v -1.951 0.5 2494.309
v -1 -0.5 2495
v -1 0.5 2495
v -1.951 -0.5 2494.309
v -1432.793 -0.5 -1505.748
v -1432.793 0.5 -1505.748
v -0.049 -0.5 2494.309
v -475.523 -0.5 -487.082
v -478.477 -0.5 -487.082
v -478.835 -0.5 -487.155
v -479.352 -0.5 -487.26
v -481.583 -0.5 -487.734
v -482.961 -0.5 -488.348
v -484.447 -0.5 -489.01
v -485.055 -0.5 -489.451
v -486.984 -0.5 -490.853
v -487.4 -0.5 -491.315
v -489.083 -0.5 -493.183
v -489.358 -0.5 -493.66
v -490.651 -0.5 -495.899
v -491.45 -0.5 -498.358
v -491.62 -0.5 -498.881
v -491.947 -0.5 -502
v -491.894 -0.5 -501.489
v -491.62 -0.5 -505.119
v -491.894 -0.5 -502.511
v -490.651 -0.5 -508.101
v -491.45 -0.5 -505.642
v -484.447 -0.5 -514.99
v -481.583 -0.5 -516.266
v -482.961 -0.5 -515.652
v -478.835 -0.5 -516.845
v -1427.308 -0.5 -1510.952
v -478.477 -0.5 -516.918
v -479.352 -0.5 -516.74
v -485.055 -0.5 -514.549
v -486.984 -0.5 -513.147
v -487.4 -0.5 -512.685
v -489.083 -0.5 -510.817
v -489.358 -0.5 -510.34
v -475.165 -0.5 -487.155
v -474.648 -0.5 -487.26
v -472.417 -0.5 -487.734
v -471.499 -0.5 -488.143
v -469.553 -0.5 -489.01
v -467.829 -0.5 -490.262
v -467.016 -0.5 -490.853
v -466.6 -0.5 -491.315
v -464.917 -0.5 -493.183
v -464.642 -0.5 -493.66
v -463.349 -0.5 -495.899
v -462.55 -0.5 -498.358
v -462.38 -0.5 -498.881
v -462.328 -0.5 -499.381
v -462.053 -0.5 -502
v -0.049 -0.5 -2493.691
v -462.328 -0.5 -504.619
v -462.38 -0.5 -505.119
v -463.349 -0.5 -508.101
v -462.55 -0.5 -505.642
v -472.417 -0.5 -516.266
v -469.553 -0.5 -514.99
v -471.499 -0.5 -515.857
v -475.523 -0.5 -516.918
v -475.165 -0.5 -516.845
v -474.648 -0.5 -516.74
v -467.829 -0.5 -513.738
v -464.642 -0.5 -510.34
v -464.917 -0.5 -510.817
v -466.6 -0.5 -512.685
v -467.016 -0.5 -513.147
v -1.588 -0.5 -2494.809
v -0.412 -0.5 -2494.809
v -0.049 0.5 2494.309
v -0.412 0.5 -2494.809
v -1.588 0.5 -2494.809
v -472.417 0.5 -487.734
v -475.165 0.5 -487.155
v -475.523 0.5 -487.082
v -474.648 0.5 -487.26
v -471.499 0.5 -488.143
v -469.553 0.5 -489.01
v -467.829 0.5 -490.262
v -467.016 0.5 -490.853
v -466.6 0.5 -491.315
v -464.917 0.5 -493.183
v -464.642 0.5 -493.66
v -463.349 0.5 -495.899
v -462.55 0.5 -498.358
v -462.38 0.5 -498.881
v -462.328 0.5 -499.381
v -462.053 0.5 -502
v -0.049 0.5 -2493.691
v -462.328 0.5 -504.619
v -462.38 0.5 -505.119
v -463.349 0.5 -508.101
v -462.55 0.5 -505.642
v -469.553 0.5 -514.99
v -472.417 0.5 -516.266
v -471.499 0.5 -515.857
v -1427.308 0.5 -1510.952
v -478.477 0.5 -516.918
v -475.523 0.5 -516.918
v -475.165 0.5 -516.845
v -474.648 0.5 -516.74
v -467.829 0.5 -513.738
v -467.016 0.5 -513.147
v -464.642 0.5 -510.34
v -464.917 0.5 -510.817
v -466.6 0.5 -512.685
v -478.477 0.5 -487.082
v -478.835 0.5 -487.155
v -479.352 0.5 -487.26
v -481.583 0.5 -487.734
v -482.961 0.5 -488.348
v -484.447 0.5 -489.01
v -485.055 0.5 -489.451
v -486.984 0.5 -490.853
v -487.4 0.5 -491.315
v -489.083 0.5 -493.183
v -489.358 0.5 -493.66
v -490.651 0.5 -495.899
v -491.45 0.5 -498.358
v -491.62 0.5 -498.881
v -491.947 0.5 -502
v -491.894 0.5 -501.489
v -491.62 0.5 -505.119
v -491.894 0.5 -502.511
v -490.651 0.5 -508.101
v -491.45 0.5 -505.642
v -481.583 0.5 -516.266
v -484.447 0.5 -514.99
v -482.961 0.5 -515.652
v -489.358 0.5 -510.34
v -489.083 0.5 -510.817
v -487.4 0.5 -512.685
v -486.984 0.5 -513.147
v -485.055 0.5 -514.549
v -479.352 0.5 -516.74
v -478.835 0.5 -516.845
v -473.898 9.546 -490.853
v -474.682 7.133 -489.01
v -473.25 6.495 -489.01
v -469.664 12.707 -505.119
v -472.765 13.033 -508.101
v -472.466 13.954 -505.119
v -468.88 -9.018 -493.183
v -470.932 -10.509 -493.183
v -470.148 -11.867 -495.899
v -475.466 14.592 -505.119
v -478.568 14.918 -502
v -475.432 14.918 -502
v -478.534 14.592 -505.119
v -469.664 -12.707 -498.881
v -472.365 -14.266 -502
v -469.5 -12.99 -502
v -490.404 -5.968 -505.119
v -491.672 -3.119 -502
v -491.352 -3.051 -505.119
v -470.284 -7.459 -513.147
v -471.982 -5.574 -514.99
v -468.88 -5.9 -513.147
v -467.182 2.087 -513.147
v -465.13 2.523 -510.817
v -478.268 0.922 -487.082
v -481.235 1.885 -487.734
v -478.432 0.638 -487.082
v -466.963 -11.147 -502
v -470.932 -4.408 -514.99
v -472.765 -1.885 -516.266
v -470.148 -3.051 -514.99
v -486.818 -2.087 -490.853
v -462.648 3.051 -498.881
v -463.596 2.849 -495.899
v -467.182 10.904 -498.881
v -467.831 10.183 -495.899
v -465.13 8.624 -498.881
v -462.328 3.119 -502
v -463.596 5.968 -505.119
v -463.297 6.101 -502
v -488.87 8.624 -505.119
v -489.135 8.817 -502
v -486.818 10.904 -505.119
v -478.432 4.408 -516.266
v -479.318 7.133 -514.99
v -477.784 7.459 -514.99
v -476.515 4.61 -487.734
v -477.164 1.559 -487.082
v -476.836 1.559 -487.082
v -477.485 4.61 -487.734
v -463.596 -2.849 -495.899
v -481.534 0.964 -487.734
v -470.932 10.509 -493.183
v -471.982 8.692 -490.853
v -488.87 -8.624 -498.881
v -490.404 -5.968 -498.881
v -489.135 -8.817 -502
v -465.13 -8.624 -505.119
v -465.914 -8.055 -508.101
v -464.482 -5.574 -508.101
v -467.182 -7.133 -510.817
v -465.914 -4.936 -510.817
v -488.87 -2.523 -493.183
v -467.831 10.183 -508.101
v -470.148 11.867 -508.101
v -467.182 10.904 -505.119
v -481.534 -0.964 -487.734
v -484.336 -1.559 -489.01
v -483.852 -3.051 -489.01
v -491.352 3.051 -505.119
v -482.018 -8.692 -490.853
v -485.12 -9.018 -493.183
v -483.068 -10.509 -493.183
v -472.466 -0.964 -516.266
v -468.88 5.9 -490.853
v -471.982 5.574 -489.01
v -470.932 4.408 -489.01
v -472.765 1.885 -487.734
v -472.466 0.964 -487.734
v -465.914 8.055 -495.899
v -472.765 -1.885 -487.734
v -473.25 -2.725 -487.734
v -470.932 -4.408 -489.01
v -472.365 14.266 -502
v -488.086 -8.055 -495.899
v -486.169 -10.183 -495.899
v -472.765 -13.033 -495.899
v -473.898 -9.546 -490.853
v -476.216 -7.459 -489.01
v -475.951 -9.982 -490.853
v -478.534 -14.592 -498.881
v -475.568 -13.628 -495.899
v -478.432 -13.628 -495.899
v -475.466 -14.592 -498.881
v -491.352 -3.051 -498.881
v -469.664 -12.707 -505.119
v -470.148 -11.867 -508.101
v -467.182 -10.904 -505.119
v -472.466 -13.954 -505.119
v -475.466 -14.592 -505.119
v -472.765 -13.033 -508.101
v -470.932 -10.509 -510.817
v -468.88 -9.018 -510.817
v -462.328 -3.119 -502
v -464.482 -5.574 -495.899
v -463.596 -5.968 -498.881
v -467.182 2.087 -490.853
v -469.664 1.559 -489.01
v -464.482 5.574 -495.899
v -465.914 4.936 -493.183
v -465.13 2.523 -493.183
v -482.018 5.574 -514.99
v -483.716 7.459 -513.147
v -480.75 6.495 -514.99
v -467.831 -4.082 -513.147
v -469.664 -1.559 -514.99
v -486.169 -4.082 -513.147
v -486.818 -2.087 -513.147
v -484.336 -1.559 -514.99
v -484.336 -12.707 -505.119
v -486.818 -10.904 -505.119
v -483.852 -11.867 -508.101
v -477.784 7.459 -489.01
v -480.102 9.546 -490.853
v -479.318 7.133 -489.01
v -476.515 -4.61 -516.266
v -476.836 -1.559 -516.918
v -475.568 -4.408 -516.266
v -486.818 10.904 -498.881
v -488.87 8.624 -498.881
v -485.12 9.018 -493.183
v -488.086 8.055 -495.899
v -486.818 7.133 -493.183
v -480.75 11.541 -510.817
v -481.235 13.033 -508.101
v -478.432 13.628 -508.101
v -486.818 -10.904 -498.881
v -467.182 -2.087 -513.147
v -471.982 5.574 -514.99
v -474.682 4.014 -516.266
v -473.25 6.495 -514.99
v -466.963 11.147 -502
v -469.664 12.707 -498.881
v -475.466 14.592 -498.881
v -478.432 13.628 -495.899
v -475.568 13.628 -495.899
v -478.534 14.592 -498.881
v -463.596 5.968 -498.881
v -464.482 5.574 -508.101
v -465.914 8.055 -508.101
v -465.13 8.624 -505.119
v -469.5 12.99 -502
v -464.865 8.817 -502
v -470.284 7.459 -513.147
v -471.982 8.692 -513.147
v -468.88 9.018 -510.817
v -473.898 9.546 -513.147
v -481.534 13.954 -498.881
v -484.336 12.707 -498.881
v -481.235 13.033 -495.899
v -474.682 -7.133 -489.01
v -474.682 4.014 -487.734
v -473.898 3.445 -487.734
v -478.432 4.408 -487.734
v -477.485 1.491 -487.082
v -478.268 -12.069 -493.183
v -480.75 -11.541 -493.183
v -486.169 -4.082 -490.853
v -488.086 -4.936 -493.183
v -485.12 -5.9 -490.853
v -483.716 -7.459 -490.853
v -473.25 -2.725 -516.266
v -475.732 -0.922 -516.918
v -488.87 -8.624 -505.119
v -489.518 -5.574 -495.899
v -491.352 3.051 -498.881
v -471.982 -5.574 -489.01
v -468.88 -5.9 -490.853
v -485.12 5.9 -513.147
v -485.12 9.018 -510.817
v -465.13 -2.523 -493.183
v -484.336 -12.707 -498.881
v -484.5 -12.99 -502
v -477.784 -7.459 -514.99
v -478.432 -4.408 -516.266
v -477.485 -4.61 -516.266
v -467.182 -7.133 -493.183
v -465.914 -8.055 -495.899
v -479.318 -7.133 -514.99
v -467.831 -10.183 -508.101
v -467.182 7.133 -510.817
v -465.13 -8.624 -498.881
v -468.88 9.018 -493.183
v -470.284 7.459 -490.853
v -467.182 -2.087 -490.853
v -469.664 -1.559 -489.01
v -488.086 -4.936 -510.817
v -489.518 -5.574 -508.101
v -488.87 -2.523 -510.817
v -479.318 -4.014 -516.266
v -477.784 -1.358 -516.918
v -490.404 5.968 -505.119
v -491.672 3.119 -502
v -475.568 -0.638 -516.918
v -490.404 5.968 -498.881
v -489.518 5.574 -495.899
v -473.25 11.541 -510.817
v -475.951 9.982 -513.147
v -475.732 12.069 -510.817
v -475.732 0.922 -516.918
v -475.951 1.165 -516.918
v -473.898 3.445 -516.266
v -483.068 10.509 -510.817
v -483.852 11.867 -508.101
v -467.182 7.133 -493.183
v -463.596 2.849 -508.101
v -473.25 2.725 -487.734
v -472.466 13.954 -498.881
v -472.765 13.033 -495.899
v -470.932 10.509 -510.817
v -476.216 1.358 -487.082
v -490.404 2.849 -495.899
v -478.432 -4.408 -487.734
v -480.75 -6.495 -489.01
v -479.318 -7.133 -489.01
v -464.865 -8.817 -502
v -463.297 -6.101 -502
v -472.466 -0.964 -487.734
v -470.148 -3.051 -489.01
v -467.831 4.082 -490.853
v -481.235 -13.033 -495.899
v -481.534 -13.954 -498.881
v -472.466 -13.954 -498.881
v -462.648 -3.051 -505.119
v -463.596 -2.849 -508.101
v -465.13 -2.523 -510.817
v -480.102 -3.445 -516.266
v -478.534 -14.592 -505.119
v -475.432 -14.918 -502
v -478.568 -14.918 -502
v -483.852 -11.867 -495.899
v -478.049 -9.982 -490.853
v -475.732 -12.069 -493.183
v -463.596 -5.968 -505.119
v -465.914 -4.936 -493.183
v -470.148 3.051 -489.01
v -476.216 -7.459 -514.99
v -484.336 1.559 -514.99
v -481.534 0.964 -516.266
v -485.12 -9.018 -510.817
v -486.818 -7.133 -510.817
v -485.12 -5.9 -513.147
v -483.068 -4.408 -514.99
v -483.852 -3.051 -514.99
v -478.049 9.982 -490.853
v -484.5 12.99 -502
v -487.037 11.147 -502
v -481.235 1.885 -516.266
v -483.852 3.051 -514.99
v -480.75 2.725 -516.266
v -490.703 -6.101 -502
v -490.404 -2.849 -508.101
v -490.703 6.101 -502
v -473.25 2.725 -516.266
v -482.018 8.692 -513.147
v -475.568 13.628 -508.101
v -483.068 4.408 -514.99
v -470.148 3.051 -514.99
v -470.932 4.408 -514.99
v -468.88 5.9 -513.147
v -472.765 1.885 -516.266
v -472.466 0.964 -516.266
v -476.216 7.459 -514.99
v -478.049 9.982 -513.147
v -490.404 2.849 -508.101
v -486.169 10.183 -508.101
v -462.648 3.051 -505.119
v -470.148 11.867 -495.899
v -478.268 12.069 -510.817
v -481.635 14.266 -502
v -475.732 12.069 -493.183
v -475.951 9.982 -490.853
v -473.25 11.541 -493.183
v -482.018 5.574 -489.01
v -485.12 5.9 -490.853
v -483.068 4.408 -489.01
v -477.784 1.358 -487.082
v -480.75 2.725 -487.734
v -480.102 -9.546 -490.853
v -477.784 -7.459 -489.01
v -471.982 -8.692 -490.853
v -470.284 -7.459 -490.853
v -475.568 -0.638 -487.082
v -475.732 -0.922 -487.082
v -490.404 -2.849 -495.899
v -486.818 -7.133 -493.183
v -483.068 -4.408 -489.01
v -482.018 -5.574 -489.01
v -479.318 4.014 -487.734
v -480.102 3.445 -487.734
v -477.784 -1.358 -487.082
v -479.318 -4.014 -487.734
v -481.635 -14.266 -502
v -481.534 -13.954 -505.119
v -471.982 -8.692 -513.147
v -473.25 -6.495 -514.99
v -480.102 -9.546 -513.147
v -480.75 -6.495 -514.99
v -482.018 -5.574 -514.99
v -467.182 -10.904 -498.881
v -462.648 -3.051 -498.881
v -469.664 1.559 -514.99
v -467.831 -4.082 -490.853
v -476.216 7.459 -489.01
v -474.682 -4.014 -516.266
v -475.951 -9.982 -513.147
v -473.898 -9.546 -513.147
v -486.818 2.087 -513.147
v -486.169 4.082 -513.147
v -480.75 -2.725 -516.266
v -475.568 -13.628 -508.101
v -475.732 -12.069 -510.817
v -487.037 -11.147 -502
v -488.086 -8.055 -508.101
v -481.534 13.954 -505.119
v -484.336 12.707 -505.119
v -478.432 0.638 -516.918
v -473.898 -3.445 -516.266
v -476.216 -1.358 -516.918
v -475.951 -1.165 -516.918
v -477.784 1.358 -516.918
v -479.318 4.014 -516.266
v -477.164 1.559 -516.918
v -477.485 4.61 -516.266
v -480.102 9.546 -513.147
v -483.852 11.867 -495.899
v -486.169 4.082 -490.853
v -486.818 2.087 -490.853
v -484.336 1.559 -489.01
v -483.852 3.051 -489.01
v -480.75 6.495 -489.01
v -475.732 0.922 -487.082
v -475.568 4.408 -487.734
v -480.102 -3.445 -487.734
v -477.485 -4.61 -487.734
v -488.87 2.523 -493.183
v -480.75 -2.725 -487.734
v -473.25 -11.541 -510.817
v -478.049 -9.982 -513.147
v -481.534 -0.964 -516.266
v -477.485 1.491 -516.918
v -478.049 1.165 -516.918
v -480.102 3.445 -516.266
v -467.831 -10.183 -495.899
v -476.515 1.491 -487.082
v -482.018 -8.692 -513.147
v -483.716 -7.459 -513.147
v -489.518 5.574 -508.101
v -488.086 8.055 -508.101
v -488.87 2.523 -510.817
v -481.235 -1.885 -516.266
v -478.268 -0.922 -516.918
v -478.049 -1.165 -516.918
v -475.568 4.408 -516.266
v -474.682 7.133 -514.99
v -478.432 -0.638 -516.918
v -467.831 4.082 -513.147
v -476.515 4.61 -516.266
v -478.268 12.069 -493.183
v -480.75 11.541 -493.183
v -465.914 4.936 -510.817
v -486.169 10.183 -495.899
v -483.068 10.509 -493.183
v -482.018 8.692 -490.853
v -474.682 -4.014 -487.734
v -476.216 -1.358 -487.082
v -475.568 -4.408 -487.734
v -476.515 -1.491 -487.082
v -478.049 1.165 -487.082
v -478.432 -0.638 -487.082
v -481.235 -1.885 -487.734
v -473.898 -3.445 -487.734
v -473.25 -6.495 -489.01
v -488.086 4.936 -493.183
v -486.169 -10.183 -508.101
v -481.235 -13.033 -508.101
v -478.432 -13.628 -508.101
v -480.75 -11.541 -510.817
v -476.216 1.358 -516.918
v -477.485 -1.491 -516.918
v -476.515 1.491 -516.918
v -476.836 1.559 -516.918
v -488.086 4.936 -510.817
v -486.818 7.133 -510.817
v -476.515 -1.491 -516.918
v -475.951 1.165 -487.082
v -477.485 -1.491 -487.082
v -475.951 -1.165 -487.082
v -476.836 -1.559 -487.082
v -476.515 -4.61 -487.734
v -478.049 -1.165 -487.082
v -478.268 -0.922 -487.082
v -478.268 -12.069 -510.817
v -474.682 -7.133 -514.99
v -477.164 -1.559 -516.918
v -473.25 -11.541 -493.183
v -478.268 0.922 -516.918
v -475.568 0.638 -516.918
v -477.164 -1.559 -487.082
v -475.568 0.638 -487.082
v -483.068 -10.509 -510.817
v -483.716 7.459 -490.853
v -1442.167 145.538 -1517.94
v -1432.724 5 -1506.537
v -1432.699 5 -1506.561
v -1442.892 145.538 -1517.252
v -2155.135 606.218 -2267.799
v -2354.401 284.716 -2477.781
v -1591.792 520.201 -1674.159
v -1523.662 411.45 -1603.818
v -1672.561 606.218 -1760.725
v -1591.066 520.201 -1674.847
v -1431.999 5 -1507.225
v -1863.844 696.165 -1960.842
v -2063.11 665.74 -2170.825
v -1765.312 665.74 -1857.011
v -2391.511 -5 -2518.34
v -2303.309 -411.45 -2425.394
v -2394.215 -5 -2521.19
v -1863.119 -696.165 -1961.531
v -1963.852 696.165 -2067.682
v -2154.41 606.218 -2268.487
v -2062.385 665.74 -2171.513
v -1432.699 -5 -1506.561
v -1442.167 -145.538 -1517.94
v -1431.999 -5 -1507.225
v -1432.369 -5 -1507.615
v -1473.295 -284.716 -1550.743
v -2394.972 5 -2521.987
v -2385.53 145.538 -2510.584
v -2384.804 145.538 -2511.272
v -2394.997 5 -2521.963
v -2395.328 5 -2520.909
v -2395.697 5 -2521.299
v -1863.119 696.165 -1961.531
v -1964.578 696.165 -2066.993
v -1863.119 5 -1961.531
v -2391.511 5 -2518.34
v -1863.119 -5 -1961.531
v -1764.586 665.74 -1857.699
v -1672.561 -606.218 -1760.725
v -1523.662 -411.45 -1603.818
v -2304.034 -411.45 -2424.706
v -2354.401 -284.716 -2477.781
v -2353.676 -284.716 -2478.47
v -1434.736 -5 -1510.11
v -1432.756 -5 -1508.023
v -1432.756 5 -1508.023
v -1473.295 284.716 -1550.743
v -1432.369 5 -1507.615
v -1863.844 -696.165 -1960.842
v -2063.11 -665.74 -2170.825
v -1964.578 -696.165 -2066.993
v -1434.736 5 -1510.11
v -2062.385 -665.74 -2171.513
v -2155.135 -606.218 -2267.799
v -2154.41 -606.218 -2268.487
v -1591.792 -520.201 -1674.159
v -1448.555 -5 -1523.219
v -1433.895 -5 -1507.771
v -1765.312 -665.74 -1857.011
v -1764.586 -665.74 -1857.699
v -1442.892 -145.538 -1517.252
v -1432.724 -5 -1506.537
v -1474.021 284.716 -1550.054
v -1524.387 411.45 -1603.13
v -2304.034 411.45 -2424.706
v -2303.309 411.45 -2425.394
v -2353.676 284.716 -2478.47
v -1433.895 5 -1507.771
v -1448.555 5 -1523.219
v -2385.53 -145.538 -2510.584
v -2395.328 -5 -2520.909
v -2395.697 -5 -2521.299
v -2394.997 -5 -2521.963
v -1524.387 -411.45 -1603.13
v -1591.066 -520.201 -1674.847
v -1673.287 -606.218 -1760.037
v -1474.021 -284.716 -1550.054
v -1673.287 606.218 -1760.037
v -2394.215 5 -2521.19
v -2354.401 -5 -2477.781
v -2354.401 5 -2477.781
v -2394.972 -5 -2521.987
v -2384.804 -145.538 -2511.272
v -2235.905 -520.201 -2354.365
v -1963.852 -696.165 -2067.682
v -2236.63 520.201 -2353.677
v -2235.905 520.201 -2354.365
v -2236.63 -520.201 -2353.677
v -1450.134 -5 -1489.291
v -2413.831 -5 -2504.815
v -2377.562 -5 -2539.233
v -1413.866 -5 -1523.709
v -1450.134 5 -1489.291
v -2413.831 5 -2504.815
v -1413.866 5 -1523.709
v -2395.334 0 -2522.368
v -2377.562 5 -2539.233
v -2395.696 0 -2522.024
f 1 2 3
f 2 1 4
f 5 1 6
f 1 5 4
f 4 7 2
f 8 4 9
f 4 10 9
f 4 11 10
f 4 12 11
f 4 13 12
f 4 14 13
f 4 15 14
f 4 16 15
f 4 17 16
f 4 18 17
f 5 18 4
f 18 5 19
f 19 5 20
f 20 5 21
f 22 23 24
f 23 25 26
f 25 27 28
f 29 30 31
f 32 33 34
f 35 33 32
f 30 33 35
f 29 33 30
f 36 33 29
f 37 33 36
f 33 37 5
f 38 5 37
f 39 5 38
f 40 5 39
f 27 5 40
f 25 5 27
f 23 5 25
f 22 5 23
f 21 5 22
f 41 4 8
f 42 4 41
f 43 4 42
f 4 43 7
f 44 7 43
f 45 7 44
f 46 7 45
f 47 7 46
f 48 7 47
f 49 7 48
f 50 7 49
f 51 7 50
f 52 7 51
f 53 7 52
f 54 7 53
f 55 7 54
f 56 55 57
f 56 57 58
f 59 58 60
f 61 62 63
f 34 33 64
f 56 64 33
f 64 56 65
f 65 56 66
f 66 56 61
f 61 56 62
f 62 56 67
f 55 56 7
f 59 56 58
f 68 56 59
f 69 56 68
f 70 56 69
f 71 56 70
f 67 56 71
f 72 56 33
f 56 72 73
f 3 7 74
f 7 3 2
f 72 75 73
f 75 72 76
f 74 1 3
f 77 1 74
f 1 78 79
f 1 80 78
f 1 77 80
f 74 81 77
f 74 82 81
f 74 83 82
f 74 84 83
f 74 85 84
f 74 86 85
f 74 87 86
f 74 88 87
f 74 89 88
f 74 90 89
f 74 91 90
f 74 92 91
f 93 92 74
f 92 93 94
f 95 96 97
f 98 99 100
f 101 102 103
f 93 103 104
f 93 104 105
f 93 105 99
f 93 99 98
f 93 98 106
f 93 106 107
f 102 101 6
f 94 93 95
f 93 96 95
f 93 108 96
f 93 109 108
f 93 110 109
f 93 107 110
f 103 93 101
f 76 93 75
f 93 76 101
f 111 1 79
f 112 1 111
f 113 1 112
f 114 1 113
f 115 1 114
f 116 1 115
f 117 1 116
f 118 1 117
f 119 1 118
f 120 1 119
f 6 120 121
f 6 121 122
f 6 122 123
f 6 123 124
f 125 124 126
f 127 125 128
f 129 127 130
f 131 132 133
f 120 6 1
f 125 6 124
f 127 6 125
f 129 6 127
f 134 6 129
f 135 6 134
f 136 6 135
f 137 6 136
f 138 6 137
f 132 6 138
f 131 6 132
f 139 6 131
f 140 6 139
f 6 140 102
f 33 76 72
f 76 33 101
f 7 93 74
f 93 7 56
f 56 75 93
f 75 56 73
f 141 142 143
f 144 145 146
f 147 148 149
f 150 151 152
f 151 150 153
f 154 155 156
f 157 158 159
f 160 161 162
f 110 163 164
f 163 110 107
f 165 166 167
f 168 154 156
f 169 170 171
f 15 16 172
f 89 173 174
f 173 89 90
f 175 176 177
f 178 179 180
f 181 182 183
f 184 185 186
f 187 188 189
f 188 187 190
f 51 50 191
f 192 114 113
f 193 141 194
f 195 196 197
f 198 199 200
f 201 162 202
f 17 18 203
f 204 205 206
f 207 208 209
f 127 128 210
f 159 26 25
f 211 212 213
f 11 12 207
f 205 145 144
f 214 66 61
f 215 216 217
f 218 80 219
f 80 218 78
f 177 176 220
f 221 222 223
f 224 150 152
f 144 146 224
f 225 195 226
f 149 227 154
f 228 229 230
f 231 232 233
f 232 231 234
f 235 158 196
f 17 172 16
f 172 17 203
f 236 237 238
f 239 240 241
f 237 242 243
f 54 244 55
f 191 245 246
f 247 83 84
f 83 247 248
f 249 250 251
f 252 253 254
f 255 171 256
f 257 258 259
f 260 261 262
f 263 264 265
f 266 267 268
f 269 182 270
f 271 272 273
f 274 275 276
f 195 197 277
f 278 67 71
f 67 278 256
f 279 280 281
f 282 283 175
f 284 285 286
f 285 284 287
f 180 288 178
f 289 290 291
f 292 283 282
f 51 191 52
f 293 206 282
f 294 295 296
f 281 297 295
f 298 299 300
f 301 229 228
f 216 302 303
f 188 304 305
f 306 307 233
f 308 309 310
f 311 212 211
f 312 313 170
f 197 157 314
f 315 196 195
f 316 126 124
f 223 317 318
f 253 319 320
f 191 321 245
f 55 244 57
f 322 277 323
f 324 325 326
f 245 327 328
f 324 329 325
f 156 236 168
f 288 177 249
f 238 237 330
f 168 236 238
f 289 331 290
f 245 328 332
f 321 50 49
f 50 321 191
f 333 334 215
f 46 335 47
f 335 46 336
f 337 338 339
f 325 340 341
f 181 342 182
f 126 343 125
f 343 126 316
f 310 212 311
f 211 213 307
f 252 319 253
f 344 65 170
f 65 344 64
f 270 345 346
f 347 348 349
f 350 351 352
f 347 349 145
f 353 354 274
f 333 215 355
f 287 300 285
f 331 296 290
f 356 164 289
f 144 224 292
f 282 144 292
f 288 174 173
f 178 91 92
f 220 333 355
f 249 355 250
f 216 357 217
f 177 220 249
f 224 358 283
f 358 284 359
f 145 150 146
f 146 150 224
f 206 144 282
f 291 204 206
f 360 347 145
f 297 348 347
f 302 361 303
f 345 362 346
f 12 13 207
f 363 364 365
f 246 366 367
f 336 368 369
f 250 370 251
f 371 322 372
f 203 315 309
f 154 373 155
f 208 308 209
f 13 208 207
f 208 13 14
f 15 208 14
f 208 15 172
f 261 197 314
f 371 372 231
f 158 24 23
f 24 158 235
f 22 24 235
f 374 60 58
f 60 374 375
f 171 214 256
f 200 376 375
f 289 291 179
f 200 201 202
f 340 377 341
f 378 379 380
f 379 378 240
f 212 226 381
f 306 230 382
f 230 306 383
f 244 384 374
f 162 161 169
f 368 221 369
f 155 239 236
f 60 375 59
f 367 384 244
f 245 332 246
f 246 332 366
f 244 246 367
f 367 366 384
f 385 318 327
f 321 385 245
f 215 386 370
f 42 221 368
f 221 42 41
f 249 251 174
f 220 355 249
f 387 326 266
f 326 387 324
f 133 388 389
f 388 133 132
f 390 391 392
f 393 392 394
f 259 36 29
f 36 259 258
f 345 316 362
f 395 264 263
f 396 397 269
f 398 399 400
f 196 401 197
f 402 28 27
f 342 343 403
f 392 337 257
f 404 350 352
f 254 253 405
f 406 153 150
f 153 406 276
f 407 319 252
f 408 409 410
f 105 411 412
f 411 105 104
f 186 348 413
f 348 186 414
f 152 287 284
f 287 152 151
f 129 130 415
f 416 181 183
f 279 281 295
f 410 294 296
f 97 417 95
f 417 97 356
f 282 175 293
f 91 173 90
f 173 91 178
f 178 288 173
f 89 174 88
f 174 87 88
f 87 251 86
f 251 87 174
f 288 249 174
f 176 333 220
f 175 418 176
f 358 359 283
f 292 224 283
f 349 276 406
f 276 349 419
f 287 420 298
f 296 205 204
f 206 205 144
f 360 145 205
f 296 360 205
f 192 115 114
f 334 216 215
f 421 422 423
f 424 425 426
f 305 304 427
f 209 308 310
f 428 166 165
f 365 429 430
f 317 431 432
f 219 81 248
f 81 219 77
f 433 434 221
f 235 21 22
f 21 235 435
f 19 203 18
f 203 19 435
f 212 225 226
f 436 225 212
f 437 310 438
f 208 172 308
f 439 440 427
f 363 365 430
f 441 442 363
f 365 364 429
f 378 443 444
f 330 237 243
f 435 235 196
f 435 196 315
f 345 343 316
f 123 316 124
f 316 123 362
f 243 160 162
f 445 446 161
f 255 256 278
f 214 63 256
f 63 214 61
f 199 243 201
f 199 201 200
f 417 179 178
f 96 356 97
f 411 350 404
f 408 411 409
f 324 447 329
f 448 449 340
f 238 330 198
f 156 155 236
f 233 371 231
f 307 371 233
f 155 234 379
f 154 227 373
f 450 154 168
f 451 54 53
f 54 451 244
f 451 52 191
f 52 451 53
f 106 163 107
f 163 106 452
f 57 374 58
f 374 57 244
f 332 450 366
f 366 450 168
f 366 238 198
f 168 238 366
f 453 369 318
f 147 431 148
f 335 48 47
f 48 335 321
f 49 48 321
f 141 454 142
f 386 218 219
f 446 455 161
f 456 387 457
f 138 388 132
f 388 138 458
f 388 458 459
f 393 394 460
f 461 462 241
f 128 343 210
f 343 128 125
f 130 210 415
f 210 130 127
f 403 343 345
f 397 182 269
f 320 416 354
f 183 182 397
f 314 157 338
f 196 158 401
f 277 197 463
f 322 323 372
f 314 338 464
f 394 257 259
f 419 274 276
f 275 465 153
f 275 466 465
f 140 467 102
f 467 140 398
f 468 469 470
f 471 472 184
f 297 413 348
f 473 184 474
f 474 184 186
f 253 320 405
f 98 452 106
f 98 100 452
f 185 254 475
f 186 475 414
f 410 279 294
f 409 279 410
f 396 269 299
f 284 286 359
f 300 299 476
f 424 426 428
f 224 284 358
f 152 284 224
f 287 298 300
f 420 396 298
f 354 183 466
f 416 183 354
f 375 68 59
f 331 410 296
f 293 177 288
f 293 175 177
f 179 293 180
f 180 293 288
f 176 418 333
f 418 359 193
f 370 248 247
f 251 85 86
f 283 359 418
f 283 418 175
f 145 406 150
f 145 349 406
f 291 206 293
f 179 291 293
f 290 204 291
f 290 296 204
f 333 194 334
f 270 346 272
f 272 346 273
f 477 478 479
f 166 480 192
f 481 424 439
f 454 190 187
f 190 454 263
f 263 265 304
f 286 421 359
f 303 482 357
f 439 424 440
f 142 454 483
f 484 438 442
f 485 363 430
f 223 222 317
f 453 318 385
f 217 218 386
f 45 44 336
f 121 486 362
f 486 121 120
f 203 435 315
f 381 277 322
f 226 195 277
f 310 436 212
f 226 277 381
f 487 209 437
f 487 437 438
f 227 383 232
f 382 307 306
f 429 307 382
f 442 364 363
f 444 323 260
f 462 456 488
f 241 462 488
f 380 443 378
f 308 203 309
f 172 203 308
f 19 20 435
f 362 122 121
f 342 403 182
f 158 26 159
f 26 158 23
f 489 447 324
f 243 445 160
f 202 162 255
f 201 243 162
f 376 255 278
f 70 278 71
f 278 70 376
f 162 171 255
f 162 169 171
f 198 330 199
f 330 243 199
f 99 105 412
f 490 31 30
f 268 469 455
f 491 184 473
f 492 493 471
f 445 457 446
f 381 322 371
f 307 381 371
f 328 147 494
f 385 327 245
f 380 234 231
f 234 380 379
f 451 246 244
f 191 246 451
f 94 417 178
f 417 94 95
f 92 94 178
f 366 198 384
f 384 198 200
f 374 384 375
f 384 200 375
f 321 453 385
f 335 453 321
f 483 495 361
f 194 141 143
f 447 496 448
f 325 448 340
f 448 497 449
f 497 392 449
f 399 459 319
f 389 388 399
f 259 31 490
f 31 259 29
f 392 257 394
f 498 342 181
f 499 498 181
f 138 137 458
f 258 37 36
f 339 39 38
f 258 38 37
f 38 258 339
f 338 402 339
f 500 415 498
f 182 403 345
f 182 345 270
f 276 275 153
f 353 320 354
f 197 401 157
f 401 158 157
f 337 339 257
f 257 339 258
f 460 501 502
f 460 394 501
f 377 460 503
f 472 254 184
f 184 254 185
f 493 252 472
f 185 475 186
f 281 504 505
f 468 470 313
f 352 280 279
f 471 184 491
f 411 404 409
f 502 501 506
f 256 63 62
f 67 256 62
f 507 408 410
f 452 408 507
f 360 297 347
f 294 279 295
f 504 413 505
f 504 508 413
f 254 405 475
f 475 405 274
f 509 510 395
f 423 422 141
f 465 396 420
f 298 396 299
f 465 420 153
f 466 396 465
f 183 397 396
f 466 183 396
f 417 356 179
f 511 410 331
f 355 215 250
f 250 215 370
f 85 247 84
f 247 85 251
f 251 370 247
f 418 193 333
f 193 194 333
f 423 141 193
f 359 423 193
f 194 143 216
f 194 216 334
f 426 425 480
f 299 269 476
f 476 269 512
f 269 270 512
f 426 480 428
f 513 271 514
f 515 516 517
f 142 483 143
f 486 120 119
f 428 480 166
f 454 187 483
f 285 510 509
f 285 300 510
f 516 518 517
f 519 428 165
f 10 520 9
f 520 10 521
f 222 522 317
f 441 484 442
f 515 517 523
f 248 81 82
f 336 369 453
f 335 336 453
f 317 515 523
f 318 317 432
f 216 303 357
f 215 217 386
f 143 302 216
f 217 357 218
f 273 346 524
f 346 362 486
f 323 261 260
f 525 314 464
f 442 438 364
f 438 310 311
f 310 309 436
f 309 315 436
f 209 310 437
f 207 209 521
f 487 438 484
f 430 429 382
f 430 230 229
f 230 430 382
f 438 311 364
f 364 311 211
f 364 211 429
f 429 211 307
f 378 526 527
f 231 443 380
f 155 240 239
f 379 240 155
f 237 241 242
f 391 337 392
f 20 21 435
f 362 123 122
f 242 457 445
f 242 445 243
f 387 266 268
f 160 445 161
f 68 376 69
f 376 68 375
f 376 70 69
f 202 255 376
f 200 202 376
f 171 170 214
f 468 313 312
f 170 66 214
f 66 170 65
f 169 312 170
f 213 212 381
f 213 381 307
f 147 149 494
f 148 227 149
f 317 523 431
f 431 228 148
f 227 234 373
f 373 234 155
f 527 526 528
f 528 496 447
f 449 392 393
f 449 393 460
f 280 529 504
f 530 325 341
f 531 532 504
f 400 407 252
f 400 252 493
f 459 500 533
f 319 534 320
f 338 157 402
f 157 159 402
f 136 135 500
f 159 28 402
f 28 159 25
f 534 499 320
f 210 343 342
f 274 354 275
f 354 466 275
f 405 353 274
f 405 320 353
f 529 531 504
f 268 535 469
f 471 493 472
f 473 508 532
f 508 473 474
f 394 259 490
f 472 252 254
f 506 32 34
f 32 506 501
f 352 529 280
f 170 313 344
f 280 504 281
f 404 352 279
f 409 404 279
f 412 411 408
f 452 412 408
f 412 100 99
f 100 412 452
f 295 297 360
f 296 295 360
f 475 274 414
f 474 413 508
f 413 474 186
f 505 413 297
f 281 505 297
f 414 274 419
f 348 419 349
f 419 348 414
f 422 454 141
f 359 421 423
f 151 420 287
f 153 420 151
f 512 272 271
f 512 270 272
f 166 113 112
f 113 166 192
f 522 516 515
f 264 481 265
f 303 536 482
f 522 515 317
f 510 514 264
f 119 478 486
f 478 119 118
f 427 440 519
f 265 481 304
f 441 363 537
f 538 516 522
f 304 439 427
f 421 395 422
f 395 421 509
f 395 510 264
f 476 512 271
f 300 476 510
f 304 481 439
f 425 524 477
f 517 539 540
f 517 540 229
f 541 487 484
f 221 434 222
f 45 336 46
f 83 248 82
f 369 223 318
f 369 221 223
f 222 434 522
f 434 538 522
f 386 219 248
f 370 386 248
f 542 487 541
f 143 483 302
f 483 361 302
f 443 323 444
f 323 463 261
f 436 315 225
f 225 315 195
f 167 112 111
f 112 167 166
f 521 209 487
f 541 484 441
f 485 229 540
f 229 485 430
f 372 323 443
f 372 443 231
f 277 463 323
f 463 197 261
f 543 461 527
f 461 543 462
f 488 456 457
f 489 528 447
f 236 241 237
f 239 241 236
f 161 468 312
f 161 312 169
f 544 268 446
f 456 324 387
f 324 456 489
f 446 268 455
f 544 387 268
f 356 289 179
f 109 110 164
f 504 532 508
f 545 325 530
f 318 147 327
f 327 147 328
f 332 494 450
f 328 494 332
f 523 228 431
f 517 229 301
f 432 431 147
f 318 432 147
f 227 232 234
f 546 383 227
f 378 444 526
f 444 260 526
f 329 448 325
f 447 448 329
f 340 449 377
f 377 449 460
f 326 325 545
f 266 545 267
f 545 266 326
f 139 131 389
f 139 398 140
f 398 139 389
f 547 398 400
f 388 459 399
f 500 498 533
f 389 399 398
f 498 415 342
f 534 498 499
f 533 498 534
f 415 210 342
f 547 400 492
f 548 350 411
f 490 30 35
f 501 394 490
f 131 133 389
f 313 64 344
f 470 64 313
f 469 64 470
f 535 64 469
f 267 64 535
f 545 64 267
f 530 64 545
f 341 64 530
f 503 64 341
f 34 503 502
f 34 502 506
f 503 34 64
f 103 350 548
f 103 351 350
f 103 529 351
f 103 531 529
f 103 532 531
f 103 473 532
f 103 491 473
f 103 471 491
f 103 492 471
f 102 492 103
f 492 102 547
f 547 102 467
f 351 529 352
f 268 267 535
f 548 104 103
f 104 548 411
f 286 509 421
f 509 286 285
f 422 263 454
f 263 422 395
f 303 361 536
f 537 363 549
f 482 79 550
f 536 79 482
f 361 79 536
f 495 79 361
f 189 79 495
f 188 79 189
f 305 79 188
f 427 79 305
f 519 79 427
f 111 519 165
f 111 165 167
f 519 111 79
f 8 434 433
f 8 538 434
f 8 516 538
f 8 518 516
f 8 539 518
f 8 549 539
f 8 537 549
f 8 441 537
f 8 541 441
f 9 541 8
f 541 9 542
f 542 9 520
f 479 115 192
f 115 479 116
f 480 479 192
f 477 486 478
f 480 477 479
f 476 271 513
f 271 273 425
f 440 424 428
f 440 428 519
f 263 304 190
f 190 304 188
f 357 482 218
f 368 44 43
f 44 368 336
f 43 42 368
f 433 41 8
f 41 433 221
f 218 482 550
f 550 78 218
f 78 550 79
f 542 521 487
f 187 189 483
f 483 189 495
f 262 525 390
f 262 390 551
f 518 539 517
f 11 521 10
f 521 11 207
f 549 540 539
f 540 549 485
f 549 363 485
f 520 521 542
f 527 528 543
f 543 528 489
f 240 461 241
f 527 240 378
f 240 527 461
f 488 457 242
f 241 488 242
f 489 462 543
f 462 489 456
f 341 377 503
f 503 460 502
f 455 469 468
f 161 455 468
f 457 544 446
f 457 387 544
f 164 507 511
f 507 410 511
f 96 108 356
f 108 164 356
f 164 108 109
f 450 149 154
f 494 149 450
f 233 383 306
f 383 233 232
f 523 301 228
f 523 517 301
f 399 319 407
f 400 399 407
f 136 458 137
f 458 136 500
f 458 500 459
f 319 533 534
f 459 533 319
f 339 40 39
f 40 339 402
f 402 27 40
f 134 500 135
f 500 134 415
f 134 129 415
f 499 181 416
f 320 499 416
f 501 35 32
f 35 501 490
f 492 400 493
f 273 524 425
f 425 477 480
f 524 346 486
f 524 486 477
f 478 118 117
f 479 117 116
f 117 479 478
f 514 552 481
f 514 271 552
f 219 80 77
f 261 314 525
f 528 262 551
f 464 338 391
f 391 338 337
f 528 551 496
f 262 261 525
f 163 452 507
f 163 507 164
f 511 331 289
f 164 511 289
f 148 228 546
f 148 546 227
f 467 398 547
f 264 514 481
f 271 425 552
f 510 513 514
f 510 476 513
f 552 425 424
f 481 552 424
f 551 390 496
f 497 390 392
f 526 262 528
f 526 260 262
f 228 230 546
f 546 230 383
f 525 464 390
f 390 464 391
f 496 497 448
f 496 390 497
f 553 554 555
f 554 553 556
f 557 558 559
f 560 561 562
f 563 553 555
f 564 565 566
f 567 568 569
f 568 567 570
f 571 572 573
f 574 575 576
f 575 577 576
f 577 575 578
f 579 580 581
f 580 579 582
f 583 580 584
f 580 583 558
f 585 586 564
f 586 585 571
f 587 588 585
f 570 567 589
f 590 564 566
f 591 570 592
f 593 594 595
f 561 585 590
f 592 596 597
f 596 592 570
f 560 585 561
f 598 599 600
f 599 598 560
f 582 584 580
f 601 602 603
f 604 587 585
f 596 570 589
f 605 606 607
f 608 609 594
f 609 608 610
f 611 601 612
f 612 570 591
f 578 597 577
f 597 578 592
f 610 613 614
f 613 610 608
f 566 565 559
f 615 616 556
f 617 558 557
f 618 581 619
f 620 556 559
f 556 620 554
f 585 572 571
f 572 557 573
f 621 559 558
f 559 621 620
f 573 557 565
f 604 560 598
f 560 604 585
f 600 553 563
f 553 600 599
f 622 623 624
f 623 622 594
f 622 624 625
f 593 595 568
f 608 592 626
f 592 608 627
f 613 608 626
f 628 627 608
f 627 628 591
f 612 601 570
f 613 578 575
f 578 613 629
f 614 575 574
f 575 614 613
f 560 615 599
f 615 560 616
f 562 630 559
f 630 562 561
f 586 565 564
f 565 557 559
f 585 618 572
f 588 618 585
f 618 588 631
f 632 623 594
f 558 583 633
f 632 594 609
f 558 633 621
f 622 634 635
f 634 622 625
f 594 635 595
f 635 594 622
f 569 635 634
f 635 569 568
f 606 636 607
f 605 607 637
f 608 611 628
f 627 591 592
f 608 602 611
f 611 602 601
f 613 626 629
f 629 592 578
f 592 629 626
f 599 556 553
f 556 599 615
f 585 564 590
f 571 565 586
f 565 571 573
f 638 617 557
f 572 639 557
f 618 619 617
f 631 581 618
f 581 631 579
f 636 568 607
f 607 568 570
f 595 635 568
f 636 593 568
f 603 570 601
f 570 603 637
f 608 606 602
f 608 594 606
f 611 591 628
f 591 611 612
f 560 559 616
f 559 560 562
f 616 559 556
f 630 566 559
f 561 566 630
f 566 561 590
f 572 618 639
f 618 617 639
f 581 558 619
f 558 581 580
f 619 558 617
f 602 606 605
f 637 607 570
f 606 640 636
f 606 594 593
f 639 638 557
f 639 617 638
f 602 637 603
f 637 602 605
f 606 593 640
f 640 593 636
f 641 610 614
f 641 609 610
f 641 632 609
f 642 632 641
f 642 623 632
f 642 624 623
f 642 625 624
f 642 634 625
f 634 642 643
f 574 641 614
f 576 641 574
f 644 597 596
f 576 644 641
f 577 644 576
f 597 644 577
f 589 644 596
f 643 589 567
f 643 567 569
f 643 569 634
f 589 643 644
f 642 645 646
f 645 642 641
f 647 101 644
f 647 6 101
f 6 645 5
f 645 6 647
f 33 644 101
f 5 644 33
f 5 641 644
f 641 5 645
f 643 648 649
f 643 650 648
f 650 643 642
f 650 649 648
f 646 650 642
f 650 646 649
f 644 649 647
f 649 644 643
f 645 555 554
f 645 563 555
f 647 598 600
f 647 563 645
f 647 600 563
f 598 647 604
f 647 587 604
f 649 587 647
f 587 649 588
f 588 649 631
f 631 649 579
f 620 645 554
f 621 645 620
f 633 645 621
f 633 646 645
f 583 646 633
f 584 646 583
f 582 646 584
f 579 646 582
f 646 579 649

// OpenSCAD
r1 = 1;
wid = 1;


//rotate([0,-9,0])
translate([ 0 , 0 , 4990/2 ]) 
Staksel();

module Staksel (){

    rotate([ 0 , -90 , 0 ])
    hull()  { 

        translate([ - 1 , 0 , 1 ]) 
        rotate([ 90 , 0 , 0 ])
        cylinder( r = r1 , h = wid , center = true );

        translate([  - 4989 , 0 , 1 ]) 
        rotate([ 90 , 0 , 0 ])
        cylinder( r = r1 , h = wid , center = true );

        translate([ - 4001.5 , 0 , 1432 ]) 
        rotate([ 90 , 0 , 0 ])
        cylinder( r = r1 , h = wid , center = true );

    }

    translate([ -477 , 0 , -2997 ])
    sphere(d = 30);
    

    translate([ -1432 , 0 , -4001.5 ])
    rotate([ 0 , -46.5 , 0 ])
    translate([ -700 , 0 , 0 ])
    cylinder( r = 700 , h = 1 , center=true );


    
    translate([ -1432 , 0 , -4001.5 ])
    rotate([ 0 , -46.5 , 0 ])
    translate([ -700 , 0 , 0 ])
    cube([ 1400 , 10 , 50 ] , center=true );


}
